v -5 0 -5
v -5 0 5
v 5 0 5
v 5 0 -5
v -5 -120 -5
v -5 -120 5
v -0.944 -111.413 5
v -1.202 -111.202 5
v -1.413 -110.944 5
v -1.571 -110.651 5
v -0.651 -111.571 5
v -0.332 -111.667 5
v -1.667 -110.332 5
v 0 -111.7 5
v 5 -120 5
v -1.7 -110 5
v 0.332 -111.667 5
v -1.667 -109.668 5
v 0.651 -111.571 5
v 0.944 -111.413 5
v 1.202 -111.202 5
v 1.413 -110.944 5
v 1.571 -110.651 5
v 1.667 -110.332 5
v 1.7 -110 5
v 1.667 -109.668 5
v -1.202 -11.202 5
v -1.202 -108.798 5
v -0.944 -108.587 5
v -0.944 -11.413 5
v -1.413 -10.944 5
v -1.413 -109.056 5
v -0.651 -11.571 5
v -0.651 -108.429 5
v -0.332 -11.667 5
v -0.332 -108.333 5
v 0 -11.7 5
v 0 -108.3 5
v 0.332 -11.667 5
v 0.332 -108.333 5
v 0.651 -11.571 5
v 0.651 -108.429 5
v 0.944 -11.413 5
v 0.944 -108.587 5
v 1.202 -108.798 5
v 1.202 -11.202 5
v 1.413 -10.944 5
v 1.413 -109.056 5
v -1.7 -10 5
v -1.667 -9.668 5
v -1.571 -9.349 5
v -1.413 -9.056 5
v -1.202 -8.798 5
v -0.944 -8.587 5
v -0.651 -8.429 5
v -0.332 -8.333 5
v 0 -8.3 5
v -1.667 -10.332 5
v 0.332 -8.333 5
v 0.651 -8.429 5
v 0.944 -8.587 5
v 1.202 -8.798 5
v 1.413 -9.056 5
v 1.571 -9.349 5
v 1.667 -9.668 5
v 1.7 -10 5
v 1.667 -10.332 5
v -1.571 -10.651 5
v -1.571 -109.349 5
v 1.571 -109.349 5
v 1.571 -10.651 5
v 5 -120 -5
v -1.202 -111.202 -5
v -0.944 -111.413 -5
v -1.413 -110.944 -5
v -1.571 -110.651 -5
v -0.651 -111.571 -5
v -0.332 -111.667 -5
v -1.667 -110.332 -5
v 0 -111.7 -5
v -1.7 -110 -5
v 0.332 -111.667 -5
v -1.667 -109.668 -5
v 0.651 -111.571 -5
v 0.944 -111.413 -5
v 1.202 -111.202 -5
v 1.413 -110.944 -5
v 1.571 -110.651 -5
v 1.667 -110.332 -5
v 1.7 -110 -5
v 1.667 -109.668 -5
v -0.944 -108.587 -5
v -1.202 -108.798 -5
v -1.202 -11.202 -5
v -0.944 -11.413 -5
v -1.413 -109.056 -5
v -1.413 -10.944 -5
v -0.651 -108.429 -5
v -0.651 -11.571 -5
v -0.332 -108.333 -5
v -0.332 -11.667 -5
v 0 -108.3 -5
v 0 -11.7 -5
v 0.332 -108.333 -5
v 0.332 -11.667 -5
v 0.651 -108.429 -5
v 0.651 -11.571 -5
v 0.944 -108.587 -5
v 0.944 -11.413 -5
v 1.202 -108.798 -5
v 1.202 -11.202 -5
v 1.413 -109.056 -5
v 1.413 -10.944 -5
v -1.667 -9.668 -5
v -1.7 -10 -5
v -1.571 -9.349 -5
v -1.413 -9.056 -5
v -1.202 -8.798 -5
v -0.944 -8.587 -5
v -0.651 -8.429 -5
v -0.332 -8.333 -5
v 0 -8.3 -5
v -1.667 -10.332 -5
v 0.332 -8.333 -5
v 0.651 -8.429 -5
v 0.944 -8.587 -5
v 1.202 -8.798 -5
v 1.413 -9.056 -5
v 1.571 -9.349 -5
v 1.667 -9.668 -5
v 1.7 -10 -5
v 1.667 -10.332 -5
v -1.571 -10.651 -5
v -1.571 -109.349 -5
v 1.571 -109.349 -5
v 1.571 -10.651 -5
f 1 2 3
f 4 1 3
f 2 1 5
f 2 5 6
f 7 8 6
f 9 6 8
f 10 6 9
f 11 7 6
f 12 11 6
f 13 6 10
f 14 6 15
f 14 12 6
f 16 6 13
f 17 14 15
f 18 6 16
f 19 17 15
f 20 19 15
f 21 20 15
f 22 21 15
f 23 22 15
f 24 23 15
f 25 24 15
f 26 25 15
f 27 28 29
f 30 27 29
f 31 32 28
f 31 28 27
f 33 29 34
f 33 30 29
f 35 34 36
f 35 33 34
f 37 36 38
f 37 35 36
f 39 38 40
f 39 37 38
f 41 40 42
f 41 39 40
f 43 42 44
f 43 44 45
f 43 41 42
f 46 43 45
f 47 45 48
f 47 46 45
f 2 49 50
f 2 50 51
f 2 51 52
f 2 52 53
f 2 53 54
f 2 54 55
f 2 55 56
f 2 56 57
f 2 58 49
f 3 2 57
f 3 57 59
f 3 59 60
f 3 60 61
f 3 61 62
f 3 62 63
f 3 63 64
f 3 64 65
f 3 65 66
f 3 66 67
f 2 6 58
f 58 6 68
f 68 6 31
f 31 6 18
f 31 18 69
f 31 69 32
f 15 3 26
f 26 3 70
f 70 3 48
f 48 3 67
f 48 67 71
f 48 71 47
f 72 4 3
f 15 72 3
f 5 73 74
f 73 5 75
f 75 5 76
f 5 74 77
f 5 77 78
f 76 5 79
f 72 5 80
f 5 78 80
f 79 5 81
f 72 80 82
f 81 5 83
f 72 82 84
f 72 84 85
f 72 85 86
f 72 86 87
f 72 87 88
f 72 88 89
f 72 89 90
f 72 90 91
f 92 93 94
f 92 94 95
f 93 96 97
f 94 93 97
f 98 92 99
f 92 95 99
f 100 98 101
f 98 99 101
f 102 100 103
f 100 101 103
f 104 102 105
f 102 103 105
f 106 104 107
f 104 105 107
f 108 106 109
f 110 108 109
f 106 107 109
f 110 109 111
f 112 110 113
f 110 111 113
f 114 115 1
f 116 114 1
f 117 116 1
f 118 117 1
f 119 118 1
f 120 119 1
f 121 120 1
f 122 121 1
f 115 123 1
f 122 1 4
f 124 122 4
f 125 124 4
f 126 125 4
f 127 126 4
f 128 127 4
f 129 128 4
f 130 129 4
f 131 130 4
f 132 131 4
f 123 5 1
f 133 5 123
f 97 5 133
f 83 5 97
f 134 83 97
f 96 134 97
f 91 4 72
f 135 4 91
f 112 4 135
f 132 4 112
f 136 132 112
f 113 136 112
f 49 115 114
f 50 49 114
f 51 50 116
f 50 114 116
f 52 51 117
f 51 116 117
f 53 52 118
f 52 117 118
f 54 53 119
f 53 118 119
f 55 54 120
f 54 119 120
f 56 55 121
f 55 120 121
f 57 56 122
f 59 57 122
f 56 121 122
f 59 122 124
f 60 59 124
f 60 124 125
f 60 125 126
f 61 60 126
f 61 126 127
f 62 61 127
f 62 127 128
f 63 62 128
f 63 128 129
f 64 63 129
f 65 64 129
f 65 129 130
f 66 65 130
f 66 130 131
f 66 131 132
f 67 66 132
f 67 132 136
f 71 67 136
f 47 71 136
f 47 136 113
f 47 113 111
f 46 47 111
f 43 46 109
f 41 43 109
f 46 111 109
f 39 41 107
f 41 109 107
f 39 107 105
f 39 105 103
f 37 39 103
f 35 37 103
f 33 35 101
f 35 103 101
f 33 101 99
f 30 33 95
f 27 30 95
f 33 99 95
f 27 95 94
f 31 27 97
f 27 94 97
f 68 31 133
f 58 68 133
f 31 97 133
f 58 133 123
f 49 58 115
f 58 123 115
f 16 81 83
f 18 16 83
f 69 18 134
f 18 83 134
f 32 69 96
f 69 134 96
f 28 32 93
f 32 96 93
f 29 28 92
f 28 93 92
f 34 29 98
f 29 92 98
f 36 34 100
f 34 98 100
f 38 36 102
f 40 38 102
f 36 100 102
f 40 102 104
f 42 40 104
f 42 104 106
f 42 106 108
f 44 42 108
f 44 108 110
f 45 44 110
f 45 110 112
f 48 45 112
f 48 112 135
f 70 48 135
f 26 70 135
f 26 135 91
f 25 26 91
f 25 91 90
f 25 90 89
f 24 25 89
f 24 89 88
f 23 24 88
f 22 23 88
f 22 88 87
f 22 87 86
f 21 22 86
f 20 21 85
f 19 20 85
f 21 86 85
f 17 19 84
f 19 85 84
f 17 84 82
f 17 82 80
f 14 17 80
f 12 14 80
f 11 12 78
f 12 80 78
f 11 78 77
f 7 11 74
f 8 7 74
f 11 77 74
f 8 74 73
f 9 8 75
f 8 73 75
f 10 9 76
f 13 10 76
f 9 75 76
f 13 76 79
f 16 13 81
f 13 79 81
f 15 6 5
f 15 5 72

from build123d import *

# Parameters (mm, degrees)
F0_W     = 10
F0_H     = 10
F1_DEPTH = 120
F3_D     = 3.4


with BuildPart() as f1:
    # F0 (on Front) → F1 (new body)
    with BuildSketch(Plane.XZ):
        Rectangle(F0_W, F0_H)
    extrude(amount=F1_DEPTH)

    # F3 (through all)
    with Locations(Plane.XY.offset(5)):
        with Locations((0, -10), (0, -110)):
            Hole(F3_D / 2)


solid = f1.part
